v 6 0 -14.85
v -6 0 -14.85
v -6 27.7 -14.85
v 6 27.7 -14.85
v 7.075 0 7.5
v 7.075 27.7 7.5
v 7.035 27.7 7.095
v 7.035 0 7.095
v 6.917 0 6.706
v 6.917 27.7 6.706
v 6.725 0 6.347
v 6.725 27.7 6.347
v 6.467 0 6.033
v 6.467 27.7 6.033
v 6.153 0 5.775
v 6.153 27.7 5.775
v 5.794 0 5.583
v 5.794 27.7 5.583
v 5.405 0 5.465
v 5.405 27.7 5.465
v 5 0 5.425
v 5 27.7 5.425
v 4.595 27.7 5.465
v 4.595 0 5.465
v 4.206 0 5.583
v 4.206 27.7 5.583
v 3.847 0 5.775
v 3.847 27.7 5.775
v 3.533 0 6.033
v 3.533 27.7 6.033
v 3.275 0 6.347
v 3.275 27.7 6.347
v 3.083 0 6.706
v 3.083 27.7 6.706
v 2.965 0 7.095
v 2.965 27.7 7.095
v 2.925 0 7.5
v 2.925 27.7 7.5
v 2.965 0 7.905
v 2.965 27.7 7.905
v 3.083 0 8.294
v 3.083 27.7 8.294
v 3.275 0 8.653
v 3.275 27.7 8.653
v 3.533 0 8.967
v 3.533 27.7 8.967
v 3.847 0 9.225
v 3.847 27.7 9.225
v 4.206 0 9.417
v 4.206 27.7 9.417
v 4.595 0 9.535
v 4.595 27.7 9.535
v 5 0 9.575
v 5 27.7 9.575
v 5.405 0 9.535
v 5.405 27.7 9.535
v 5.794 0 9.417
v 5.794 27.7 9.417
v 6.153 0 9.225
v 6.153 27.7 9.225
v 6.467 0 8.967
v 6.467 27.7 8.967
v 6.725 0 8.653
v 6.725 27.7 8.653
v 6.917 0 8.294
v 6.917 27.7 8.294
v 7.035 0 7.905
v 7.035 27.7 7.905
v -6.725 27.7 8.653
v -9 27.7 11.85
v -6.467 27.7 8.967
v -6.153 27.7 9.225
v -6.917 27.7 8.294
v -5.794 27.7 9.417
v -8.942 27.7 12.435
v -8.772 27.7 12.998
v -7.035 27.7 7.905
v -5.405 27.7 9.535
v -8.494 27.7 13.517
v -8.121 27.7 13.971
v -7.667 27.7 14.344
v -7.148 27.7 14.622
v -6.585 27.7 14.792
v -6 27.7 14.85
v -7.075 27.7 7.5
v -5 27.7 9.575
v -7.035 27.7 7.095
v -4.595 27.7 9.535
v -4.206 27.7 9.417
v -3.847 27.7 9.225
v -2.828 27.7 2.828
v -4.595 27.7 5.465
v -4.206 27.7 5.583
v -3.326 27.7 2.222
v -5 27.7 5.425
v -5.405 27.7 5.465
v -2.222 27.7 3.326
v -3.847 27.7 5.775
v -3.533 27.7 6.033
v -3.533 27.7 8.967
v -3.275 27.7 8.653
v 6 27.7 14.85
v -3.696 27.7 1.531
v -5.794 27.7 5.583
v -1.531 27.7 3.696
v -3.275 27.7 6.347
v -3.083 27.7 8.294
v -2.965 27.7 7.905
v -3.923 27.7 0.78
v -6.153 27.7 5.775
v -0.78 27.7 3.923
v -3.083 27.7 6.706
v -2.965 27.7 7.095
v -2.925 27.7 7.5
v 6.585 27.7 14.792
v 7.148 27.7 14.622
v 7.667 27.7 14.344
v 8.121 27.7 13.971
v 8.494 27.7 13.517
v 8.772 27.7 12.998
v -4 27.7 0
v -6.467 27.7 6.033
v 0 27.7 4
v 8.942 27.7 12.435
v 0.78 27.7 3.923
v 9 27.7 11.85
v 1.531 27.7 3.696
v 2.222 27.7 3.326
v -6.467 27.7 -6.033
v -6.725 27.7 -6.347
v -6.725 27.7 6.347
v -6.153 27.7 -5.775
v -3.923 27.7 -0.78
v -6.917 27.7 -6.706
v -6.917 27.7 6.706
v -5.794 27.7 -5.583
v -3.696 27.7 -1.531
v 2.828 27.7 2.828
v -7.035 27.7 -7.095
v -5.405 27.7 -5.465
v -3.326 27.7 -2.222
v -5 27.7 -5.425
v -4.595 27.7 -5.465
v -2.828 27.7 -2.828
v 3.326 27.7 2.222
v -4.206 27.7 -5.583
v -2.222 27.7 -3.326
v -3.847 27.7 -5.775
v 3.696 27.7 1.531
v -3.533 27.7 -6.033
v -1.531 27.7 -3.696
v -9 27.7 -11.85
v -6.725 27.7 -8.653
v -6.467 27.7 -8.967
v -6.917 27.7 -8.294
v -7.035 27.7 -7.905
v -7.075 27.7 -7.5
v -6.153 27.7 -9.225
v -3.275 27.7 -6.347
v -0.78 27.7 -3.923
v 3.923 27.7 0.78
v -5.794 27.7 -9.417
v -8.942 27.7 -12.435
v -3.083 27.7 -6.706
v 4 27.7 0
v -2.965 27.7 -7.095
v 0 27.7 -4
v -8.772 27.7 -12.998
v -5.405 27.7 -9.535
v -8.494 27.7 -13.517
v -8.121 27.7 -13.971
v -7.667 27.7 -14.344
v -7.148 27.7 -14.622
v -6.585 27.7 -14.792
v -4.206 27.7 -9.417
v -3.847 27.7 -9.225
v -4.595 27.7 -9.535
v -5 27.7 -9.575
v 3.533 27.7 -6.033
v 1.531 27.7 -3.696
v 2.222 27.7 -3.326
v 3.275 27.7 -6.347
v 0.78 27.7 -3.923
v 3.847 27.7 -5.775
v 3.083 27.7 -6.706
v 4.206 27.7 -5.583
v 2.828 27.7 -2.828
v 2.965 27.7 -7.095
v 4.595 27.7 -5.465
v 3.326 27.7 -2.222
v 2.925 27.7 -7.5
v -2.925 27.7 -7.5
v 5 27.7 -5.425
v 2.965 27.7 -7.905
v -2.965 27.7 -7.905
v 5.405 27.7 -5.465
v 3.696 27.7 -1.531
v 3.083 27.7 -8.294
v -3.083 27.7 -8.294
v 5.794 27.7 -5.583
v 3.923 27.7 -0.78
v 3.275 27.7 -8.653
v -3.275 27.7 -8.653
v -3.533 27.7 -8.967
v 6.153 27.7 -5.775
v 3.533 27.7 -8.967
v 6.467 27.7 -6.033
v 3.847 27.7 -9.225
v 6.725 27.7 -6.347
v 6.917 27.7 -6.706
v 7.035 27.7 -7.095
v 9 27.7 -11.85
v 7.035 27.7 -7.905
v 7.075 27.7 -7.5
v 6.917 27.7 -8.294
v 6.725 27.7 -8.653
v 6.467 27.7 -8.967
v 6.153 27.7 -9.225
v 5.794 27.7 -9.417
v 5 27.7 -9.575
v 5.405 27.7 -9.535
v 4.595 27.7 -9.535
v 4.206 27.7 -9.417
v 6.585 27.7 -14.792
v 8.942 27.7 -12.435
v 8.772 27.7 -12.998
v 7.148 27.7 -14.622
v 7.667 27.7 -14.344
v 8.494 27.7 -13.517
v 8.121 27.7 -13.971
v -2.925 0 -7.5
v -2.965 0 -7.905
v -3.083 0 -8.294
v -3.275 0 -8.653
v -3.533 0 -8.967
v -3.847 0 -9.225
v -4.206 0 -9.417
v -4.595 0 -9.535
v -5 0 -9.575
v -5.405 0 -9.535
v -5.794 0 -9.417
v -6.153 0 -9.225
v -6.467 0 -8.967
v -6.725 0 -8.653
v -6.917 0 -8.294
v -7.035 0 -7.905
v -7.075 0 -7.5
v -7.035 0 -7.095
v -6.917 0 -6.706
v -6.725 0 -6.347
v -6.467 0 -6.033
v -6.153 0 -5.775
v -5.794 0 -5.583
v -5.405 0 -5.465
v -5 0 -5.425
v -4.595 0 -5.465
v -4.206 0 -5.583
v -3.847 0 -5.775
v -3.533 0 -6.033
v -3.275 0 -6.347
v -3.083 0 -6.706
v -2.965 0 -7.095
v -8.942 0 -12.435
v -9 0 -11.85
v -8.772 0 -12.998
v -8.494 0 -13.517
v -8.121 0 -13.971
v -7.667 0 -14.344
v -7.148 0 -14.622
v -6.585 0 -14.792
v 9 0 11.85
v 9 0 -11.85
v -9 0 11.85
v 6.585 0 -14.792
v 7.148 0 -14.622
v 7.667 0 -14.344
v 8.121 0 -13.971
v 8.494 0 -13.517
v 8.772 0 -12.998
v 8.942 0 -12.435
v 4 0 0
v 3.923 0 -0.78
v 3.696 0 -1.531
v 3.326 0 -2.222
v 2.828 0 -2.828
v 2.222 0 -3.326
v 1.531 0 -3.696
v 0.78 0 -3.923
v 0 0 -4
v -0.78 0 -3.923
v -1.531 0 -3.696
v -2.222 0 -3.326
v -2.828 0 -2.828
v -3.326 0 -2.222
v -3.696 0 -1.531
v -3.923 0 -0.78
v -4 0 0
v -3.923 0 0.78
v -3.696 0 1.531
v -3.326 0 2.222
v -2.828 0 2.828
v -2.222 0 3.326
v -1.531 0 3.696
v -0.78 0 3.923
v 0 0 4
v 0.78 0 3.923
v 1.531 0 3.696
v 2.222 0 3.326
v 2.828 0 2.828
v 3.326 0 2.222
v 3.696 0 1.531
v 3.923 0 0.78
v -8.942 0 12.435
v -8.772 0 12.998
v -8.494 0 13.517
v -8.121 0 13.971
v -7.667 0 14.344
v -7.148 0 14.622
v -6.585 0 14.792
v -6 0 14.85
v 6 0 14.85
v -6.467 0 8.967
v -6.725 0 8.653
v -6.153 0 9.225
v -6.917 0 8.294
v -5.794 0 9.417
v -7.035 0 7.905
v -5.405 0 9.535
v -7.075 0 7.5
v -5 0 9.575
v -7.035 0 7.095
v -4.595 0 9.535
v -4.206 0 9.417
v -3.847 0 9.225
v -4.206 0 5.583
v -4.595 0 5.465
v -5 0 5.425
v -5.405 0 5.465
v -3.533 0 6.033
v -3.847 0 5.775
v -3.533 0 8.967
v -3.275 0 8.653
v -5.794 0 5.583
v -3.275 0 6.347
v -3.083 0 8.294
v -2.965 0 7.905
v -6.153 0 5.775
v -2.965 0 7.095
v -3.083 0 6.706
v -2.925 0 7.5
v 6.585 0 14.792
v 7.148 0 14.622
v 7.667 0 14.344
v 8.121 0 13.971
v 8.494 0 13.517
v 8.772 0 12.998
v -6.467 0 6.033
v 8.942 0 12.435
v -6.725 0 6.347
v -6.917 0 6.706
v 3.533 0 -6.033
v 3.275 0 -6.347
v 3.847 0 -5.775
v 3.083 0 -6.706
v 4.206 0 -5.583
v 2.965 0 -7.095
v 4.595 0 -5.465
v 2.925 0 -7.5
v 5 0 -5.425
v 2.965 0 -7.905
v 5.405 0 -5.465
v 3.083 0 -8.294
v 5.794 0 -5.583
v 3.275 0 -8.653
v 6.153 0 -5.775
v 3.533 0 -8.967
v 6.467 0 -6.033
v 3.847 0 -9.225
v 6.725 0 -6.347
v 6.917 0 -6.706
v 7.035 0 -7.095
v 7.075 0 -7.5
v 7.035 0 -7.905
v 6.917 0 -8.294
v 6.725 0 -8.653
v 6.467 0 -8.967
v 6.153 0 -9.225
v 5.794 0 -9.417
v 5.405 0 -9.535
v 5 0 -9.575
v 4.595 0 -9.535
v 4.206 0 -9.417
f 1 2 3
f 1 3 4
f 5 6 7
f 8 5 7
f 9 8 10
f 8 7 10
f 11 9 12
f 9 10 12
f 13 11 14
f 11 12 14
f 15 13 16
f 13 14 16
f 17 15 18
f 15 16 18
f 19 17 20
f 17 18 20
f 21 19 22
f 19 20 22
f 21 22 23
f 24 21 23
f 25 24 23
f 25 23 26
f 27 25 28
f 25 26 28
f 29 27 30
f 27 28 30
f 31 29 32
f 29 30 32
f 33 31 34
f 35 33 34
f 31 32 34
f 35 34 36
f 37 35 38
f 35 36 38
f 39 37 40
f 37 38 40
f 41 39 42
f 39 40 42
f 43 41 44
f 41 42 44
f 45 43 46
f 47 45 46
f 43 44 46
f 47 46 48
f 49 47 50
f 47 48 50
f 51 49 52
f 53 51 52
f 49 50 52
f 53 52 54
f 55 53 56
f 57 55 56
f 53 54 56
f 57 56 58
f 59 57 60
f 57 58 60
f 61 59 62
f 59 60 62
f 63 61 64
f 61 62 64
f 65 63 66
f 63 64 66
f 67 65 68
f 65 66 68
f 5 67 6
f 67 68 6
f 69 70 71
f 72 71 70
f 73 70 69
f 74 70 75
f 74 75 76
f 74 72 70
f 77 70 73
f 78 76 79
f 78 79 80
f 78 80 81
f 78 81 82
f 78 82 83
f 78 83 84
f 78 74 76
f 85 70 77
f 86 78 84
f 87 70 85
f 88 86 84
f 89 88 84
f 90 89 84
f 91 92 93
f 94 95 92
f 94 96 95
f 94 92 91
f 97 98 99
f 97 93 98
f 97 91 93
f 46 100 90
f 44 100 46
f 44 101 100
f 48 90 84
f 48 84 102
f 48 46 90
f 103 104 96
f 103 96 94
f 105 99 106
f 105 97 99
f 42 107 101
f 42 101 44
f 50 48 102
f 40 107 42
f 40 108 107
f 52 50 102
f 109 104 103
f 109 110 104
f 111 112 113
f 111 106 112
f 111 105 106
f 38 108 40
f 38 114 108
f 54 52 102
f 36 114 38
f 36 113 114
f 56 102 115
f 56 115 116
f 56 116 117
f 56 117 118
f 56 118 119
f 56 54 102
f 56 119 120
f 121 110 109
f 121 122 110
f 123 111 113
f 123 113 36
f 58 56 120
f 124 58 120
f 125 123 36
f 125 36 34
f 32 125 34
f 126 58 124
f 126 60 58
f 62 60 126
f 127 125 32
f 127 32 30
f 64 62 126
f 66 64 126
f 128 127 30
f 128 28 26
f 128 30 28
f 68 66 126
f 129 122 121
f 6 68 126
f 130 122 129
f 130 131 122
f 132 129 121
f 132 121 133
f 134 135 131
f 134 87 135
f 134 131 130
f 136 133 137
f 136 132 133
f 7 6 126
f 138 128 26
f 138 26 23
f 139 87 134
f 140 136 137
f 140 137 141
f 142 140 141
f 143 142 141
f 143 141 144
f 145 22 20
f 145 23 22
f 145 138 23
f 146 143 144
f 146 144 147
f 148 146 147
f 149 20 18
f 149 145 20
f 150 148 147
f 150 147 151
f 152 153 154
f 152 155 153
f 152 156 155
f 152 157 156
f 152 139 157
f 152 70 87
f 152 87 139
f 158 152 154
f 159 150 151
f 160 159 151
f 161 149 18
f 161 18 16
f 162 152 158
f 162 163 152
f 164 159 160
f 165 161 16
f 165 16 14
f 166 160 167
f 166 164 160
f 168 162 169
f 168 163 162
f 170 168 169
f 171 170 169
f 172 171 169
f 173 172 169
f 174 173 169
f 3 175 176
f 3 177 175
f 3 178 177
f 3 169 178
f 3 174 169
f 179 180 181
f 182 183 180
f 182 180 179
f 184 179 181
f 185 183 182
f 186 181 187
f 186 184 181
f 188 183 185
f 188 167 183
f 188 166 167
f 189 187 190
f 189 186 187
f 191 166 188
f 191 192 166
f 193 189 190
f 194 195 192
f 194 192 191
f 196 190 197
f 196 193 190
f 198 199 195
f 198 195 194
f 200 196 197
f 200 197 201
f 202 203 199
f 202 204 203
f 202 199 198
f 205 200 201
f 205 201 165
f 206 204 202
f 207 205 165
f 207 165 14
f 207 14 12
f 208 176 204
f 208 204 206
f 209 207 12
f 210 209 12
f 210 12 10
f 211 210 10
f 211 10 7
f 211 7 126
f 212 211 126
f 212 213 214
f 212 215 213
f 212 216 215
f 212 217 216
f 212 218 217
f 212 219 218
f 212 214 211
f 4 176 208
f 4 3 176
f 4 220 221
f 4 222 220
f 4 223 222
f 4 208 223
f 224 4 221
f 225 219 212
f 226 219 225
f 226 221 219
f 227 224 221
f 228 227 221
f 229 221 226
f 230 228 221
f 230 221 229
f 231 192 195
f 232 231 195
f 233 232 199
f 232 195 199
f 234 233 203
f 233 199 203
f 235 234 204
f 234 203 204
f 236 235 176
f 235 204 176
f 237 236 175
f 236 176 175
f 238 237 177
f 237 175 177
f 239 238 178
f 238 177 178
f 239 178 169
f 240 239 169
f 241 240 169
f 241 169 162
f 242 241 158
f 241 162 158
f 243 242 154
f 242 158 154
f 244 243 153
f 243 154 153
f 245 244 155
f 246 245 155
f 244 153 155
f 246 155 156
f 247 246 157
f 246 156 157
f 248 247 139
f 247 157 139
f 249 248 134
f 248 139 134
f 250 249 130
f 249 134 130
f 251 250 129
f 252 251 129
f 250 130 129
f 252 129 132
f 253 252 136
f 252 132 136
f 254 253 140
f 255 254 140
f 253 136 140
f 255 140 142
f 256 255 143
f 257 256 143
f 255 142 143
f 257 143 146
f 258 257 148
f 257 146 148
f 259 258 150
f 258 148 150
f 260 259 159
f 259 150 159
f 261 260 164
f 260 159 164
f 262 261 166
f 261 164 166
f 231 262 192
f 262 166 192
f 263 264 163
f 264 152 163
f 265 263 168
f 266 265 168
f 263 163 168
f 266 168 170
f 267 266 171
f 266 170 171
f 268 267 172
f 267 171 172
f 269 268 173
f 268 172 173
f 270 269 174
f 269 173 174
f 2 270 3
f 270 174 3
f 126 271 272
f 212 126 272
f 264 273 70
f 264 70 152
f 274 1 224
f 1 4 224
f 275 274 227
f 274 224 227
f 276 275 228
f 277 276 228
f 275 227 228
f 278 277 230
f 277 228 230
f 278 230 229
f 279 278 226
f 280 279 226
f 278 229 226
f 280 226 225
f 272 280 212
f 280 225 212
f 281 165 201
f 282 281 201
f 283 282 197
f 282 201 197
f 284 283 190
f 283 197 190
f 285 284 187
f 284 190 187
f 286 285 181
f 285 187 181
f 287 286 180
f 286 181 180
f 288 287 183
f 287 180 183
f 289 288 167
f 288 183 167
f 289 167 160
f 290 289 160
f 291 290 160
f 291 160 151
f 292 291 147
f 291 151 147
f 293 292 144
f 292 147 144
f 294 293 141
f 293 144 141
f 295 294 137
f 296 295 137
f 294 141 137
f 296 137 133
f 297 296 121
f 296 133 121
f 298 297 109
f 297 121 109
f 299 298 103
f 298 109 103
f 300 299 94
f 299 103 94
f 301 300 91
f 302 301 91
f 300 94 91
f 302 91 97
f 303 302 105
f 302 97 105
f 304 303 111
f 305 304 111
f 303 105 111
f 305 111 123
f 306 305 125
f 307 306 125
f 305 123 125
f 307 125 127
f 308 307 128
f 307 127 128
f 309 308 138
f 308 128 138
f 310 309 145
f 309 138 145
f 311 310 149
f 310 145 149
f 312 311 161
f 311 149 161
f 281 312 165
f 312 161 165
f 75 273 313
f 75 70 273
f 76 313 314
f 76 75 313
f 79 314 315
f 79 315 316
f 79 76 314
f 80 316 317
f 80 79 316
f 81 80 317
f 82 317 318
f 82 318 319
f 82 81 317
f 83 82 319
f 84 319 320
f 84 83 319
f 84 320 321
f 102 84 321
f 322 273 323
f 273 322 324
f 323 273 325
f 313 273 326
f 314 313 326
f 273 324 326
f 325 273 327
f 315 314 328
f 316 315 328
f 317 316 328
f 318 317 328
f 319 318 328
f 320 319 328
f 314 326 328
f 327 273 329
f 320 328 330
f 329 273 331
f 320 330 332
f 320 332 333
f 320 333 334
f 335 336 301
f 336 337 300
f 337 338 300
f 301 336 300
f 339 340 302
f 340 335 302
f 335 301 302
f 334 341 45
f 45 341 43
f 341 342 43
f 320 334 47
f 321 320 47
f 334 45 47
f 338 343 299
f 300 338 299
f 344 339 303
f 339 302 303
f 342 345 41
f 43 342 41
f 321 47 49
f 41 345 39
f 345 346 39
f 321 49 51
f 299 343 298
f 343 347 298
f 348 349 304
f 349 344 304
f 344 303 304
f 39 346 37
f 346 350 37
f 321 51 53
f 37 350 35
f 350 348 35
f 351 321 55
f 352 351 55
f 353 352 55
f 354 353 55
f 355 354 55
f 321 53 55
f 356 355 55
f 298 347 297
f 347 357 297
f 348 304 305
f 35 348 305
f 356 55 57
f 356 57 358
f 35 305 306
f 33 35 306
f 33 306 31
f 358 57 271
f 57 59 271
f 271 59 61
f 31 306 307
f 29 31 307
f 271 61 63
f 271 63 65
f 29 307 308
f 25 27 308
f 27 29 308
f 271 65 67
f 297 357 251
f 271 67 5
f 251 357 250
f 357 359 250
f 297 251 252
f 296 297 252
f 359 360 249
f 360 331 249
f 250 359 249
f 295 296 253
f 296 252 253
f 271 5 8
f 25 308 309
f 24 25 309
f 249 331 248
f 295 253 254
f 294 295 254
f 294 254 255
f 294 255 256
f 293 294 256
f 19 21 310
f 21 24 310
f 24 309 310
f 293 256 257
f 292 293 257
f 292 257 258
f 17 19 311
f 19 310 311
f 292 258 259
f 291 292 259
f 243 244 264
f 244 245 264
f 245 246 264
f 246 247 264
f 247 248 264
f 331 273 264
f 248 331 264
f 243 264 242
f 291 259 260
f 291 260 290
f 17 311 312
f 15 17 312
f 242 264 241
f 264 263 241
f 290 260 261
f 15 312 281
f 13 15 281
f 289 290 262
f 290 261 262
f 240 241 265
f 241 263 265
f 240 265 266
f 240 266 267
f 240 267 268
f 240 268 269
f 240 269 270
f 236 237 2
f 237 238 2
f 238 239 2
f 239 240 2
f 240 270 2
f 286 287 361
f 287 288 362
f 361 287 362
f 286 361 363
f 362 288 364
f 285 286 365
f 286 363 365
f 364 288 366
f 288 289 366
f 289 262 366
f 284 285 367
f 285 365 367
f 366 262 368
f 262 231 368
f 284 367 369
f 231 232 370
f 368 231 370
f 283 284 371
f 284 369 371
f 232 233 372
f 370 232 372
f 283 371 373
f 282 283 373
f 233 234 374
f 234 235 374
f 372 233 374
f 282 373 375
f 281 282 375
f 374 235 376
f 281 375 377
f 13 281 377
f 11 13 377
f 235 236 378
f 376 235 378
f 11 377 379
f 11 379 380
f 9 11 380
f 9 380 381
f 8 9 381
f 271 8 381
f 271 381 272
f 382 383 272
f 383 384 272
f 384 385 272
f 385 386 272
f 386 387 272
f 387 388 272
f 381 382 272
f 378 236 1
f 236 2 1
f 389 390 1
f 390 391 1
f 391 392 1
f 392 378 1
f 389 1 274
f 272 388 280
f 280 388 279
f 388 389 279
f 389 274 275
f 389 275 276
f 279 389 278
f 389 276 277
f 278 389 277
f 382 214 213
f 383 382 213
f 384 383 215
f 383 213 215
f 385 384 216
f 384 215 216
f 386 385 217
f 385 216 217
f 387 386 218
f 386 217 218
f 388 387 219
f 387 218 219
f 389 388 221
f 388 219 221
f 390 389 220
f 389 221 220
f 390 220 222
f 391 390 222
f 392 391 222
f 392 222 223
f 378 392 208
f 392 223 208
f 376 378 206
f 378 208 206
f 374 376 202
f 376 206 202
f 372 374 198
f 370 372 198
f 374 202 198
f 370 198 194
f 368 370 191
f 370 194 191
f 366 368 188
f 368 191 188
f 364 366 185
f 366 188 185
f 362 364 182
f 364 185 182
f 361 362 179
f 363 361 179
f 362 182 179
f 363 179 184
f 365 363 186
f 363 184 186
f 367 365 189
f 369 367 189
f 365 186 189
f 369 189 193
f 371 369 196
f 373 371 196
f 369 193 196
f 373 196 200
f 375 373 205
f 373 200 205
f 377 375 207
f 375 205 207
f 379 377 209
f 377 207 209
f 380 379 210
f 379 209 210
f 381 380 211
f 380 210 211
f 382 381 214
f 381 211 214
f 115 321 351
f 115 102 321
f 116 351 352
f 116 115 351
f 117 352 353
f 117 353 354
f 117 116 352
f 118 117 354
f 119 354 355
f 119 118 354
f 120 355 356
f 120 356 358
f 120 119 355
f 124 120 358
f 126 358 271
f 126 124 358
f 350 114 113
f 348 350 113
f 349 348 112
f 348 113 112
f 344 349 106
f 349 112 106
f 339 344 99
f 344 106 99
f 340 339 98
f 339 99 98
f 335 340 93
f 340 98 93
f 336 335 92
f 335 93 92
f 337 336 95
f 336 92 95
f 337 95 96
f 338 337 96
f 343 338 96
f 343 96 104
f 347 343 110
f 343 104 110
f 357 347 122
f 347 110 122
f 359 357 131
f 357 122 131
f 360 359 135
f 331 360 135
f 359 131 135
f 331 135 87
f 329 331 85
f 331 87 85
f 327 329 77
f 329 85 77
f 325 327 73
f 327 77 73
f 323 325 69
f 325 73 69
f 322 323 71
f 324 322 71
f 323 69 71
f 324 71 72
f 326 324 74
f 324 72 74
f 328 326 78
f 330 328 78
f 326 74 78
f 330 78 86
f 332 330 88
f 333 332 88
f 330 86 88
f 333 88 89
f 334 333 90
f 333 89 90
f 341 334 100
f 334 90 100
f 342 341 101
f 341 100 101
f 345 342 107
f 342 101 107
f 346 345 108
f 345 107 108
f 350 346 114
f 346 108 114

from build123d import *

# Parameters (mm, degrees)
SKETCH_1_W          = 18
SKETCH_1_H          = 29.7
EXTRUDE_1_DEPTH     = 27.7
SKETCH_2_R          = 2.075
CUT_EXTRUDE_1_DEPTH = 27.7
FILLET_1_R          = 3
SKETCH_3_R          = 4
CUT_EXTRUDE_2_DEPTH = 27.7


with BuildPart() as part:
    # 草图1 → 凸台-拉伸1 (new body)
    with BuildSketch(Plane(origin=(0, 0, 0), x_dir=(1, 0, 0), z_dir=(0, 1, 0))):
        Rectangle(SKETCH_1_W, SKETCH_1_H)
    extrude(amount=EXTRUDE_1_DEPTH)

    # 草图2 → 切除-拉伸1 (cut)
    with BuildSketch(Plane(origin=(0, 27.7, 0), x_dir=(1, 0, 0), z_dir=(0, 1, 0))):
        with Locations((5, 7.5)):
            Circle(SKETCH_2_R)
        with Locations((-5, 7.5)):
            Circle(SKETCH_2_R)
        with Locations((-5, -7.5)):
            Circle(SKETCH_2_R)
        with Locations((5, -7.5)):
            Circle(SKETCH_2_R)
    extrude(amount=-CUT_EXTRUDE_1_DEPTH, mode=Mode.SUBTRACT)

    # 圆角1
    fillet_1_edges = [part.edges().sort_by_distance(p)[0] for p in [
        (9, 13.85, 14.85),
        (-9, 13.85, 14.85),
        (-9, 13.85, -14.85),
        (9, 13.85, -14.85),
    ]]
    fillet(fillet_1_edges, radius=FILLET_1_R)

    # 草图3 → 切除-拉伸2 (cut)
    with BuildSketch(Plane(origin=(0, 27.7, 0), x_dir=(1, 0, 0), z_dir=(0, 1, 0))):
        Circle(SKETCH_3_R)
    extrude(amount=-CUT_EXTRUDE_2_DEPTH, mode=Mode.SUBTRACT)


solid = part.part
